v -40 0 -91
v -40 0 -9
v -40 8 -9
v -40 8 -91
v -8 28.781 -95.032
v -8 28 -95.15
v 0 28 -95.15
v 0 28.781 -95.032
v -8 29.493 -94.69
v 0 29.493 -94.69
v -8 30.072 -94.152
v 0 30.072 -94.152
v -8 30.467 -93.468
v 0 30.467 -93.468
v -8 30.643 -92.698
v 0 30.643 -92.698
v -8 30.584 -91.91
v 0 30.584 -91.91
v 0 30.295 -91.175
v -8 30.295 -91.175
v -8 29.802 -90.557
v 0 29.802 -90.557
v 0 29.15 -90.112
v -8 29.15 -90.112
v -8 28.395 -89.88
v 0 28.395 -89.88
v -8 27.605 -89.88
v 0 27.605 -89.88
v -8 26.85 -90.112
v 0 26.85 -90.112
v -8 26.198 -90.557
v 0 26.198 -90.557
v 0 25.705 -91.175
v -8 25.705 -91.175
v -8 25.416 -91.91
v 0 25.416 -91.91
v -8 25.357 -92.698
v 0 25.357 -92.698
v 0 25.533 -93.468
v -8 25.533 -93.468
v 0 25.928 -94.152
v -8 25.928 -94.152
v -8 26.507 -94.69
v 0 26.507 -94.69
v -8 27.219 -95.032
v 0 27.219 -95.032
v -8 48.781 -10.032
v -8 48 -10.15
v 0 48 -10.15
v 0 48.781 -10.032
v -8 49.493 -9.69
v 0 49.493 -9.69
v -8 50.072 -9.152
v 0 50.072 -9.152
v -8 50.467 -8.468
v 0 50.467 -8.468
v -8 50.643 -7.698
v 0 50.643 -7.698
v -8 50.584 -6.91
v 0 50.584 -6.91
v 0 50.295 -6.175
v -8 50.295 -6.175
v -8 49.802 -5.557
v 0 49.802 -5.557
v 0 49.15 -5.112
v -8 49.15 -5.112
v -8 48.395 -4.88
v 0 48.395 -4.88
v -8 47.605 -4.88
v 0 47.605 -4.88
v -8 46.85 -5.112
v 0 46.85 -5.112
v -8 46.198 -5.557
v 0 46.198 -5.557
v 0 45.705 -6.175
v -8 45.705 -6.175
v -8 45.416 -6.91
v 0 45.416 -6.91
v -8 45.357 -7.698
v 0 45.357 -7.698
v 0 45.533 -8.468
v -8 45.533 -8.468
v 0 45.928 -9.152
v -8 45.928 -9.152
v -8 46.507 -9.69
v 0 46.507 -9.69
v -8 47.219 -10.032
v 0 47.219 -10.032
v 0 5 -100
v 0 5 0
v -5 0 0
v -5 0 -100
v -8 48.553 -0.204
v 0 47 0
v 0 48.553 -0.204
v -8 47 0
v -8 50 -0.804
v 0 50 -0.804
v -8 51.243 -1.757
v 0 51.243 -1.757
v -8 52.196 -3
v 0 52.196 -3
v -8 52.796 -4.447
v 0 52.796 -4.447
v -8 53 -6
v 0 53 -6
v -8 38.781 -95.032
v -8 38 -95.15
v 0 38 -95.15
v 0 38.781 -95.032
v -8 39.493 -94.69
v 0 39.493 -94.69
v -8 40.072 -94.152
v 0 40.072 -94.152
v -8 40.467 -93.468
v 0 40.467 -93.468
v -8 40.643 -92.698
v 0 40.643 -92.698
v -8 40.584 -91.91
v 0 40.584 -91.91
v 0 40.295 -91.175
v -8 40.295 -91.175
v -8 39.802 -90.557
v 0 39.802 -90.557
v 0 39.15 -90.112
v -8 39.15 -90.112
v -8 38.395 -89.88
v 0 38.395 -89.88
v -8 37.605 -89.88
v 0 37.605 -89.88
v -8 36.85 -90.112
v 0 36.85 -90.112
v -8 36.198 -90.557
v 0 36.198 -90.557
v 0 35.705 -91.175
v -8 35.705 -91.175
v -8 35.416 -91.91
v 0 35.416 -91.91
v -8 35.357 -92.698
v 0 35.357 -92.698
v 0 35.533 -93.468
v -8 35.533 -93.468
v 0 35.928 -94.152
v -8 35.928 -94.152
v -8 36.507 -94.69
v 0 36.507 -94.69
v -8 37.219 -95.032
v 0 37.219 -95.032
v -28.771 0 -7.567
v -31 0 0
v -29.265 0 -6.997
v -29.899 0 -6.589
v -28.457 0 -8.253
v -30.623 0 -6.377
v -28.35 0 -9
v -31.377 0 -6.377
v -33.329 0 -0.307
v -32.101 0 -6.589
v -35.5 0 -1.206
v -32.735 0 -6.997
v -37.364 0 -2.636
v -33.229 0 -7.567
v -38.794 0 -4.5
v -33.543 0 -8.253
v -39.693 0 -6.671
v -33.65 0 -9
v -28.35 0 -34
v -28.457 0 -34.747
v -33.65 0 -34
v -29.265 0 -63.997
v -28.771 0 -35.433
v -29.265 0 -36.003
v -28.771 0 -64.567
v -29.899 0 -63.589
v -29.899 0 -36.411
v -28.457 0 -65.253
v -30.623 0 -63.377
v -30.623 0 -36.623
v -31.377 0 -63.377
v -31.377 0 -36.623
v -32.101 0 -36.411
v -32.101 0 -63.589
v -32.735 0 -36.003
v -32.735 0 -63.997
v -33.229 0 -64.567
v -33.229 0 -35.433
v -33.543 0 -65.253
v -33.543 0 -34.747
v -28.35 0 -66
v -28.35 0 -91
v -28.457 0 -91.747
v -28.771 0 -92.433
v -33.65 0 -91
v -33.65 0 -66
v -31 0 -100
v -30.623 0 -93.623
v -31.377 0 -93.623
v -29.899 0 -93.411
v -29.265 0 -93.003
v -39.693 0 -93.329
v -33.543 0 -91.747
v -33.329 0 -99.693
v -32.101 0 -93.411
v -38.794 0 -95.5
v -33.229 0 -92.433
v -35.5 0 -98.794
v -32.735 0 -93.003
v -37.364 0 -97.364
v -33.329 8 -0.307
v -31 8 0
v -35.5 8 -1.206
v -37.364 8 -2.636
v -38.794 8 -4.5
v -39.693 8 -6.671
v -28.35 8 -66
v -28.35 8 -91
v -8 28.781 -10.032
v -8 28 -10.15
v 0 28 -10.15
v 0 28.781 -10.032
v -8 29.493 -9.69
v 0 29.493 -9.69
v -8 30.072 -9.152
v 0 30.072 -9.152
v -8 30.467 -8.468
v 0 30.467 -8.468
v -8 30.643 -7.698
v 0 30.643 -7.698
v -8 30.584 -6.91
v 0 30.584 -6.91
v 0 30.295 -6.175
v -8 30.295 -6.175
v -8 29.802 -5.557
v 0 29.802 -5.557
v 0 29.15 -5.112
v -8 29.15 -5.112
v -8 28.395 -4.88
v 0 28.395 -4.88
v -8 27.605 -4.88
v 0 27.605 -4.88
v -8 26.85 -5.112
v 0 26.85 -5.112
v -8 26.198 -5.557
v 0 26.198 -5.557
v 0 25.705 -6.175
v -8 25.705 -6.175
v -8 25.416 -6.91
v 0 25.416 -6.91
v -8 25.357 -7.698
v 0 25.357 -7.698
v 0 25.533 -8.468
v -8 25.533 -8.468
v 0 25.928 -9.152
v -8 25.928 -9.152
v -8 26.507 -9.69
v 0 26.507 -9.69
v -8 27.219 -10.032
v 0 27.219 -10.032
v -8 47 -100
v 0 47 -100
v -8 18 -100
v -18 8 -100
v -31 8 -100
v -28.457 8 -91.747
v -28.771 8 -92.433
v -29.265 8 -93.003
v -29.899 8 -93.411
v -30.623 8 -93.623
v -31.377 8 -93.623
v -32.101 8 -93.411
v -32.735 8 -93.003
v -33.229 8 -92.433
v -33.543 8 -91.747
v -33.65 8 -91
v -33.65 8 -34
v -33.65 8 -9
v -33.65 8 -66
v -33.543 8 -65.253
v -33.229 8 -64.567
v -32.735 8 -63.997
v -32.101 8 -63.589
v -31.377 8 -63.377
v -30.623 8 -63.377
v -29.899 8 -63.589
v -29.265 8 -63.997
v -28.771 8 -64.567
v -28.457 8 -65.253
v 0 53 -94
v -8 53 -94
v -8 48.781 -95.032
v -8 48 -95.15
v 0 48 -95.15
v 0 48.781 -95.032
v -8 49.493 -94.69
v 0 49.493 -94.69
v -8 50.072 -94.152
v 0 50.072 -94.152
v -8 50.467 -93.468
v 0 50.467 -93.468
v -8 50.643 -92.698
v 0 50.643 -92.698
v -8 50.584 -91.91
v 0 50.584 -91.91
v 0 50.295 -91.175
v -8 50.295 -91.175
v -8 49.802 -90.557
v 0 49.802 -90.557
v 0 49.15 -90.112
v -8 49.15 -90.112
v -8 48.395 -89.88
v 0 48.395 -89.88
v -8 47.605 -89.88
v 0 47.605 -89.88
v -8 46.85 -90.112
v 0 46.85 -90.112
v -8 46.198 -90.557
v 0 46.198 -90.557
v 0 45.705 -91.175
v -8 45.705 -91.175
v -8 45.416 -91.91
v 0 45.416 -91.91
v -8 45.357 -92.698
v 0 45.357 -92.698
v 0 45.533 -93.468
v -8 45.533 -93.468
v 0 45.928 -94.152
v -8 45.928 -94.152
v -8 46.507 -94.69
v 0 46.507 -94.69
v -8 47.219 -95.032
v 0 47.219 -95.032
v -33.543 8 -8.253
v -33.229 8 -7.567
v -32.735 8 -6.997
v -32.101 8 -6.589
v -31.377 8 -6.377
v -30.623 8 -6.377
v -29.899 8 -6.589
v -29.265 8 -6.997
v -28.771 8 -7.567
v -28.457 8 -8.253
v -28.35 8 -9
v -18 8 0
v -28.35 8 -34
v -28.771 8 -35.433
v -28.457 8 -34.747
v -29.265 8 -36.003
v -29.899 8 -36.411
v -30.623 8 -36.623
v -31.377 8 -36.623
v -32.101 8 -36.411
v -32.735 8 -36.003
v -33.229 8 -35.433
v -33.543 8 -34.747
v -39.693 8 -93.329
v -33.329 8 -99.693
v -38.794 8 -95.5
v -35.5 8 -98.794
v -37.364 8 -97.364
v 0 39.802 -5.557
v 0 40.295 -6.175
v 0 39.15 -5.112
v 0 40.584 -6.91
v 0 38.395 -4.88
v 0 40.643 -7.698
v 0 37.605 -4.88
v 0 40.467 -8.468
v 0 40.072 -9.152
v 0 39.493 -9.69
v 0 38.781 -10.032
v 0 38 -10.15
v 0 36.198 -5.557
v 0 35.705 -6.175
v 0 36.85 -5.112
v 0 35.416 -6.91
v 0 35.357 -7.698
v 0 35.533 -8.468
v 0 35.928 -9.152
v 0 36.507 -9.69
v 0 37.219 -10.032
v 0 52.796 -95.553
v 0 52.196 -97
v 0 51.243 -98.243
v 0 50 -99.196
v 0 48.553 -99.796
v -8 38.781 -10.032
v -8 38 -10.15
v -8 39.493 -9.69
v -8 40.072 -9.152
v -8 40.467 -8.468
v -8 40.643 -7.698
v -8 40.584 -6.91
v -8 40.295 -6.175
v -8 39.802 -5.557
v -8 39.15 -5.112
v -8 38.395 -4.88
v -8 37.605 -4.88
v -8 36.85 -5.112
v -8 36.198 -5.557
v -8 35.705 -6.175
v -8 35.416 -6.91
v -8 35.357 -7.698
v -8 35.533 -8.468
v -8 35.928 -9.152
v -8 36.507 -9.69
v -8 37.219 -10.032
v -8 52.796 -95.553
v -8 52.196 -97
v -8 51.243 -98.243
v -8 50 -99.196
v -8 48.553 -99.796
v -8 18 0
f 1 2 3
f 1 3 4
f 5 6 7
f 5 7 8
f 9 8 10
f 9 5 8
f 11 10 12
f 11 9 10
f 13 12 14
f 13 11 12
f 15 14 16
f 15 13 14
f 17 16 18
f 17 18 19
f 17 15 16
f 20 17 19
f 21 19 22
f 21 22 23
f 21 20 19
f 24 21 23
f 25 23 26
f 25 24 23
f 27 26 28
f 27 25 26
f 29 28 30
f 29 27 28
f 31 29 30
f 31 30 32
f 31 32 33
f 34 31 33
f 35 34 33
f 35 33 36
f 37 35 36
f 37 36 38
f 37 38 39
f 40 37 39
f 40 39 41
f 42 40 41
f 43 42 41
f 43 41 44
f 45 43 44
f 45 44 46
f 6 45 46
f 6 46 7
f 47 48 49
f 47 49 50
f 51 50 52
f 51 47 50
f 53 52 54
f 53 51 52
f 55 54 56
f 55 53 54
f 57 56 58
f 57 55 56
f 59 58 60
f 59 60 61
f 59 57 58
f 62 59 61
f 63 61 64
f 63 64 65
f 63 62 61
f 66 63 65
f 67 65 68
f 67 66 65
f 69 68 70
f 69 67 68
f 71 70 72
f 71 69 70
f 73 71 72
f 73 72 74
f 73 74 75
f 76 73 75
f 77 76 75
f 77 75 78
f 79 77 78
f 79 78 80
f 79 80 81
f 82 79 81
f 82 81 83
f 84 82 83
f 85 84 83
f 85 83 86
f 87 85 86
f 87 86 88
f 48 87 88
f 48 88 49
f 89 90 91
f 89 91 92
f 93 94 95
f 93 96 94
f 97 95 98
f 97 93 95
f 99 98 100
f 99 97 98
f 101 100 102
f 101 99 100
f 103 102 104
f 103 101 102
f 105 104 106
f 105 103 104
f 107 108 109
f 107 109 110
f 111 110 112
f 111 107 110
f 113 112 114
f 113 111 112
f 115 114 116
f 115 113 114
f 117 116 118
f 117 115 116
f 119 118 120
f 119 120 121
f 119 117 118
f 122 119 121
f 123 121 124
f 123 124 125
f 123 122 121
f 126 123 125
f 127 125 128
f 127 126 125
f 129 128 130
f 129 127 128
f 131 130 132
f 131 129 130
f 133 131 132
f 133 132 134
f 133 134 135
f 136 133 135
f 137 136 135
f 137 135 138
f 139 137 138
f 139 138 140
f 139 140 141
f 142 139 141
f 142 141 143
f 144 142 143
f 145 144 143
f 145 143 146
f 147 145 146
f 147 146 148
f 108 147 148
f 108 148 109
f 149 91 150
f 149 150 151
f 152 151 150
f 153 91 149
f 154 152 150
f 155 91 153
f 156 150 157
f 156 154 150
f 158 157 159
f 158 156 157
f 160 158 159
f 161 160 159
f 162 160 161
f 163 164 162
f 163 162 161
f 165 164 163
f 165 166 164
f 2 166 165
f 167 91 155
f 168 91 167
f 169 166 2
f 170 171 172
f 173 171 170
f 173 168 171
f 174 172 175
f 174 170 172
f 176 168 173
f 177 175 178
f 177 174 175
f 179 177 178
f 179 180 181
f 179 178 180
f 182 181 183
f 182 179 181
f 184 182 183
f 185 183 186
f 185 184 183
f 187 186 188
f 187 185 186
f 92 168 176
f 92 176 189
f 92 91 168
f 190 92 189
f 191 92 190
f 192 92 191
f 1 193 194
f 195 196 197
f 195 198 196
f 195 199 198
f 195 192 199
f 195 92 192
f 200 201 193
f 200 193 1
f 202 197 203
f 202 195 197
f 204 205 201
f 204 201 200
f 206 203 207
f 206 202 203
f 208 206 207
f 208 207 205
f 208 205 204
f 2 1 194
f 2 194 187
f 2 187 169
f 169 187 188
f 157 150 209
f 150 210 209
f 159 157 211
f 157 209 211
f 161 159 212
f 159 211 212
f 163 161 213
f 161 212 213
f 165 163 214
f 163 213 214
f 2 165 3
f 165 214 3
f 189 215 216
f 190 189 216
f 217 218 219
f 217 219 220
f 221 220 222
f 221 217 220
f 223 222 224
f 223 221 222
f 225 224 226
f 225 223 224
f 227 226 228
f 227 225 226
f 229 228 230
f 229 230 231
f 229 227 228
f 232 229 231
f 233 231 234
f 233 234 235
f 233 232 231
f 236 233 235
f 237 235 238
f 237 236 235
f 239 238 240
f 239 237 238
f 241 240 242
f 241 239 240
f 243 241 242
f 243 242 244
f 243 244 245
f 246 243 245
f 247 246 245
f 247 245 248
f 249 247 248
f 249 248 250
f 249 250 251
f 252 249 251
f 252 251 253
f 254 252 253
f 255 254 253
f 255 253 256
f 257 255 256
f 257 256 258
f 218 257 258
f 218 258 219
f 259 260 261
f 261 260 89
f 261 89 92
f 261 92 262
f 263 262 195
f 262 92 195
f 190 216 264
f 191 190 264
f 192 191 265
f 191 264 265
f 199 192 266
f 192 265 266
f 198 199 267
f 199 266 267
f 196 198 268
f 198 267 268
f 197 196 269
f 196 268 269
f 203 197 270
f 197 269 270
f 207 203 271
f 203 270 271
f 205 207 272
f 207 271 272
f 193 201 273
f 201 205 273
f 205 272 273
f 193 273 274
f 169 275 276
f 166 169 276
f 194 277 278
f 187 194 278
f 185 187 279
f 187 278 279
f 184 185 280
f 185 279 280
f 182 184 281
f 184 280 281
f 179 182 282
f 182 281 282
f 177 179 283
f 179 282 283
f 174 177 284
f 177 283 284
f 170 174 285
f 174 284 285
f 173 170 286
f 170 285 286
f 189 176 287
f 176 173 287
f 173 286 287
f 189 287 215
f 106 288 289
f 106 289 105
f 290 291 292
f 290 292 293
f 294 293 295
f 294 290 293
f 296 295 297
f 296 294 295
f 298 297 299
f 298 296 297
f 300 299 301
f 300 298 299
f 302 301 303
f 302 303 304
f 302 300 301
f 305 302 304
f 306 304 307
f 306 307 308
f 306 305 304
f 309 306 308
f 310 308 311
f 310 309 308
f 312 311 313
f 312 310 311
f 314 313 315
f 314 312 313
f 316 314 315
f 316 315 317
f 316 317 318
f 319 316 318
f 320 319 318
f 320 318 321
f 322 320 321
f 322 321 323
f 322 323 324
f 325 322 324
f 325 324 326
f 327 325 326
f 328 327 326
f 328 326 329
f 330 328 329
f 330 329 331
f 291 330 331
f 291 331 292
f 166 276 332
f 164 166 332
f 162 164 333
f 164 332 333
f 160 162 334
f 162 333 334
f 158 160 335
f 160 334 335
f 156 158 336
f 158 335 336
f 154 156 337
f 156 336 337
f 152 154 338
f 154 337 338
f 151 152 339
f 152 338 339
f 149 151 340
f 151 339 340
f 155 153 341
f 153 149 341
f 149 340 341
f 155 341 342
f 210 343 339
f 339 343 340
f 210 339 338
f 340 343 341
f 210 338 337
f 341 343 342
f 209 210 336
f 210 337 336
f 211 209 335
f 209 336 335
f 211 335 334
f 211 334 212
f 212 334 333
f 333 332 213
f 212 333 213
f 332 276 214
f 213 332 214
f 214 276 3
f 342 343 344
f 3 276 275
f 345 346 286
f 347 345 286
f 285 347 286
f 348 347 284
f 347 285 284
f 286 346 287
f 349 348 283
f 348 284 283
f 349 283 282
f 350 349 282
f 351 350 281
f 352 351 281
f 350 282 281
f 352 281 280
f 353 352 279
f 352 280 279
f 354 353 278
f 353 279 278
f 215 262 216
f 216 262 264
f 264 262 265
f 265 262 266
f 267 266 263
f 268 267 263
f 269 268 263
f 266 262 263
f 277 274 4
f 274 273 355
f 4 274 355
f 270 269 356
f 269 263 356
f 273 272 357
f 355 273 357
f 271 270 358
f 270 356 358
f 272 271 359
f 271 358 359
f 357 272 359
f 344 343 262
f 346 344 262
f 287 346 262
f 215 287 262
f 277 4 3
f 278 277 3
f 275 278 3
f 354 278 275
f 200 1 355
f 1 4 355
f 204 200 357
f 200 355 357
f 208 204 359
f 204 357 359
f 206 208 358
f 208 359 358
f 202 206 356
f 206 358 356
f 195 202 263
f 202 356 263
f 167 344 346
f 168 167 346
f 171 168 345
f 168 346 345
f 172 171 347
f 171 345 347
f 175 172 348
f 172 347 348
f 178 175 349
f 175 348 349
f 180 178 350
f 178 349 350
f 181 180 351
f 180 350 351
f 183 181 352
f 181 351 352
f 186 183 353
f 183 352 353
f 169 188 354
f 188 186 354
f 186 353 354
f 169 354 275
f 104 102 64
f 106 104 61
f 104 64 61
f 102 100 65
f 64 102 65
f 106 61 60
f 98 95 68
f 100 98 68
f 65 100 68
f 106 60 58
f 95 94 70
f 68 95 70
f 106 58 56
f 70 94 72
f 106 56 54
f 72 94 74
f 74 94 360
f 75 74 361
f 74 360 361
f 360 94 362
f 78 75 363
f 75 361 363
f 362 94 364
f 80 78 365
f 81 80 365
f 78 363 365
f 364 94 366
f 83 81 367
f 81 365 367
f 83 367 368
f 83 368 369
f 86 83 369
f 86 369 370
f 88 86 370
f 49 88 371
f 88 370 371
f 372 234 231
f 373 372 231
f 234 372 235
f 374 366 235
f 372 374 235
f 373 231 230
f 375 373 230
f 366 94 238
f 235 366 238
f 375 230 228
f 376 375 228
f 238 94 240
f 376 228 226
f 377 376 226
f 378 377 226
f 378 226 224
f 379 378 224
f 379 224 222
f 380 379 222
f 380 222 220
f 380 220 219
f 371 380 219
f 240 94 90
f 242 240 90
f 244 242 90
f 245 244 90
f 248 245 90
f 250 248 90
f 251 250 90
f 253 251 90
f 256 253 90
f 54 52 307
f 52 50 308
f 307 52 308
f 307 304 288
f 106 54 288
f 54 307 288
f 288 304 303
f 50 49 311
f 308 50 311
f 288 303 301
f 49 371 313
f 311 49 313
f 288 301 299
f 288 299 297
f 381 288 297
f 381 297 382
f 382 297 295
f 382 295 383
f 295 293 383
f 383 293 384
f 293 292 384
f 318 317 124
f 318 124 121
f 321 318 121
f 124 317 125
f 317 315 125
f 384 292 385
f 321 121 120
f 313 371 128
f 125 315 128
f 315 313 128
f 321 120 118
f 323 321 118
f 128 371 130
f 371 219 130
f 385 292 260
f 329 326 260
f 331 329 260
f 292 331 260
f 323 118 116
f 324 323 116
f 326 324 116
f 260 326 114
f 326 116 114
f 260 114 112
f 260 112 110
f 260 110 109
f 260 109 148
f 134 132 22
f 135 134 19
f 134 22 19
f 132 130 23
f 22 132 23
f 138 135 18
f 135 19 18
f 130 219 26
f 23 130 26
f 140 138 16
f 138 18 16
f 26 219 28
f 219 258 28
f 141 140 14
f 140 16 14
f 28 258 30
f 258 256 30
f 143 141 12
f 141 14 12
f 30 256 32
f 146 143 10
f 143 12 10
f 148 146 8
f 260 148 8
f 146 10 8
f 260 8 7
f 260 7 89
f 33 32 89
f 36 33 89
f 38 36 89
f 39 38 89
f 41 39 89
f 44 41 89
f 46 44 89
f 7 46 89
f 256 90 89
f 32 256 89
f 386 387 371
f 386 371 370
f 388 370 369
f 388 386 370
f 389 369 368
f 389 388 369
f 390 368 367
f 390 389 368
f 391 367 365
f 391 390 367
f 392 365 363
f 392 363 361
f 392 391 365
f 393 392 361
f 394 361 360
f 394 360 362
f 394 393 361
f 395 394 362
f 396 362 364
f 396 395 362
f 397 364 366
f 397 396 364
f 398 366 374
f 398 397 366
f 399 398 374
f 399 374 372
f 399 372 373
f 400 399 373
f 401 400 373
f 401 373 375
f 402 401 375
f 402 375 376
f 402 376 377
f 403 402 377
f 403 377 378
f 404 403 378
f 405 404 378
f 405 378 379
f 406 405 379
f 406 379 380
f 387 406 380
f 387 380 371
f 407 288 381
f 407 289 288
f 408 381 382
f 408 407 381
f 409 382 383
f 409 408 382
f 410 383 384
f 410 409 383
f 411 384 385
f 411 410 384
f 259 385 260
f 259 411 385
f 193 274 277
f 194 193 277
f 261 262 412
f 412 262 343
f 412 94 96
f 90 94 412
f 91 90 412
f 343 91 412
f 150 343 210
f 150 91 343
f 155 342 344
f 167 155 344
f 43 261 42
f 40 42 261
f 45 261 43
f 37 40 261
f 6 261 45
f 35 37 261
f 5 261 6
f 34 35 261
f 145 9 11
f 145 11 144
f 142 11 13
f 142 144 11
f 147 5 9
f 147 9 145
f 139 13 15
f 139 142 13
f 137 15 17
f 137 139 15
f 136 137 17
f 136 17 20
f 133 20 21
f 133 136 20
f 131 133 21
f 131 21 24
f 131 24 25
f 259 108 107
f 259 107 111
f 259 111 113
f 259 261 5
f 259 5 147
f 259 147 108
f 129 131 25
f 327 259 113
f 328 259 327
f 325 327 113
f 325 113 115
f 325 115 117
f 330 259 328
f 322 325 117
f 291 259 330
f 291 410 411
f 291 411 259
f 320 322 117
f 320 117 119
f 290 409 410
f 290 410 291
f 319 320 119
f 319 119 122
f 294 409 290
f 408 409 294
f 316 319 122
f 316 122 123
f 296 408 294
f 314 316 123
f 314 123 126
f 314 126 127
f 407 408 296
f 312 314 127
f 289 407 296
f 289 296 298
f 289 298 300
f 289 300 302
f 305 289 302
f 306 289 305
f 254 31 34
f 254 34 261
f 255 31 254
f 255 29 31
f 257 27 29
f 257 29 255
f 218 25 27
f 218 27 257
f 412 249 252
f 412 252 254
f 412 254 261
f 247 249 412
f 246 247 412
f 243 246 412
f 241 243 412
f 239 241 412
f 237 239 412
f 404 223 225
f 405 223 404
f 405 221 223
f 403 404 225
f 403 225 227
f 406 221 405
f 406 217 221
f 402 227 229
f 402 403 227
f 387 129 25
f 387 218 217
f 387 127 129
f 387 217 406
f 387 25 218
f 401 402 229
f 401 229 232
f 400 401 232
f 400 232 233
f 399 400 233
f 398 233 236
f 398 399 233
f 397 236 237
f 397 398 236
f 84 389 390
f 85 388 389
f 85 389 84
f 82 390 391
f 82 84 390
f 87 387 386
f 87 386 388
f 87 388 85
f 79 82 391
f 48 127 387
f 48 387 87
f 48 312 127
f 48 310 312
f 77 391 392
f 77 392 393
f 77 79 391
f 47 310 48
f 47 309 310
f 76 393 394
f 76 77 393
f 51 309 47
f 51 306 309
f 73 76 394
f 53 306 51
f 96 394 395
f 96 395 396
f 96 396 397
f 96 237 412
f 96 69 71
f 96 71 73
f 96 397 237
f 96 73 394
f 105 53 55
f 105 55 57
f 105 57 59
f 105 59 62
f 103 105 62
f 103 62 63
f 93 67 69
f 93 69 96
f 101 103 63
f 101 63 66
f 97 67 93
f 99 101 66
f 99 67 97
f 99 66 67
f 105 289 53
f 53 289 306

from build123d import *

# Parameters (mm, degrees)
SKETCH1_W           = 40
SKETCH1_H           = 100
BOSS_EXTRUDE1_DEPTH = 8
SKETCH2_W           = 100
SKETCH2_H           = 53
BOSS_EXTRUDE2_DEPTH = 8
SKETCH3_R           = 2.65
CUT_EXTRUDE1_DEPTH  = 9
FILLET1_R           = 6
CHAMFER2_SIZE       = 10
FILLET3_R           = 9
CUT_EXTRUDE3_DEPTH  = 9
CHAMFER1_SIZE       = 5


with BuildPart() as part:
    # Sketch1 → Boss-Extrude1 (new body)
    with BuildSketch(Plane(origin=(0, 0, 0), x_dir=(1, 0, 0), z_dir=(0, 1, 0))):
        with Locations((20, 50)):
            Rectangle(SKETCH1_W, SKETCH1_H)
    extrude(amount=BOSS_EXTRUDE1_DEPTH)

    # Sketch2 → Boss-Extrude2 (add)
    with BuildSketch(Plane.ZY):
        with Locations((-50, 26.5)):
            Rectangle(SKETCH2_W, SKETCH2_H)
    extrude(amount=-BOSS_EXTRUDE2_DEPTH)

    # Sketch3 → Cut-Extrude1 (cut, through all)
    with BuildSketch(Plane(origin=(8, 0, 0), x_dir=(0, 0, -1), z_dir=(1, 0, 0))):
        with Locations((7.5, 48)):
            Circle(SKETCH3_R)
        with Locations((92.5, 28)):
            Circle(SKETCH3_R)
        with Locations((92.5, 48)):
            Circle(SKETCH3_R)
        with Locations((92.5, 38)):
            Circle(SKETCH3_R)
        with Locations((7.5, 28)):
            Circle(SKETCH3_R)
        with Locations((7.5, 38)):
            Circle(SKETCH3_R)
    extrude(amount=-CUT_EXTRUDE1_DEPTH, mode=Mode.SUBTRACT)

    # Fillet1
    fillet1_edges = [part.edges().sort_by_distance(p)[0] for p in [
        (4, 53, 0),
        (4, 53, -100),
    ]]
    fillet(fillet1_edges, radius=FILLET1_R)

    # Chamfer2
    chamfer2_edges = [part.edges().sort_by_distance(p)[0] for p in [
        (8, 8, -50),
    ]]
    chamfer(chamfer2_edges, length=CHAMFER2_SIZE)

    # Fillet3
    fillet3_edges = [part.edges().sort_by_distance(p)[0] for p in [
        (40, 4, -100),
        (40, 4, 0),
    ]]
    fillet(fillet3_edges, radius=FILLET3_R)

    # Sketch5 → Cut-Extrude3 (cut, through all)
    with BuildSketch(Plane(origin=(0, 8, 0), x_dir=(1, 0, 0), z_dir=(0, 1, 0))):
        with BuildLine():
            Line((33.65, 91), (33.65, 66))
            ThreePointArc((33.65, 66), (31, 63.35), (28.35, 66))
            Line((28.35, 66), (28.35, 91))
            ThreePointArc((28.35, 91), (31, 93.65), (33.65, 91))
        make_face()
        with BuildLine():
            Line((33.65, 34), (33.65, 9))
            ThreePointArc((33.65, 9), (31, 6.35), (28.35, 9))
            Line((28.35, 9), (28.35, 34))
            ThreePointArc((28.35, 34), (31, 36.65), (33.65, 34))
        make_face()
    extrude(amount=-CUT_EXTRUDE3_DEPTH, mode=Mode.SUBTRACT)

    # Chamfer1
    chamfer1_edges = [part.edges().sort_by_distance(p)[0] for p in [
        (0, 0, -50),
    ]]
    chamfer(chamfer1_edges, length=CHAMFER1_SIZE)


with BuildPart() as body_2:
    # Mirror1: mirrored copy
    add(part.part.mirror(Plane(origin=(0, 8, 0), x_dir=(0, 0, 1), z_dir=(1, 0, 0))))


solid = body_2.part
